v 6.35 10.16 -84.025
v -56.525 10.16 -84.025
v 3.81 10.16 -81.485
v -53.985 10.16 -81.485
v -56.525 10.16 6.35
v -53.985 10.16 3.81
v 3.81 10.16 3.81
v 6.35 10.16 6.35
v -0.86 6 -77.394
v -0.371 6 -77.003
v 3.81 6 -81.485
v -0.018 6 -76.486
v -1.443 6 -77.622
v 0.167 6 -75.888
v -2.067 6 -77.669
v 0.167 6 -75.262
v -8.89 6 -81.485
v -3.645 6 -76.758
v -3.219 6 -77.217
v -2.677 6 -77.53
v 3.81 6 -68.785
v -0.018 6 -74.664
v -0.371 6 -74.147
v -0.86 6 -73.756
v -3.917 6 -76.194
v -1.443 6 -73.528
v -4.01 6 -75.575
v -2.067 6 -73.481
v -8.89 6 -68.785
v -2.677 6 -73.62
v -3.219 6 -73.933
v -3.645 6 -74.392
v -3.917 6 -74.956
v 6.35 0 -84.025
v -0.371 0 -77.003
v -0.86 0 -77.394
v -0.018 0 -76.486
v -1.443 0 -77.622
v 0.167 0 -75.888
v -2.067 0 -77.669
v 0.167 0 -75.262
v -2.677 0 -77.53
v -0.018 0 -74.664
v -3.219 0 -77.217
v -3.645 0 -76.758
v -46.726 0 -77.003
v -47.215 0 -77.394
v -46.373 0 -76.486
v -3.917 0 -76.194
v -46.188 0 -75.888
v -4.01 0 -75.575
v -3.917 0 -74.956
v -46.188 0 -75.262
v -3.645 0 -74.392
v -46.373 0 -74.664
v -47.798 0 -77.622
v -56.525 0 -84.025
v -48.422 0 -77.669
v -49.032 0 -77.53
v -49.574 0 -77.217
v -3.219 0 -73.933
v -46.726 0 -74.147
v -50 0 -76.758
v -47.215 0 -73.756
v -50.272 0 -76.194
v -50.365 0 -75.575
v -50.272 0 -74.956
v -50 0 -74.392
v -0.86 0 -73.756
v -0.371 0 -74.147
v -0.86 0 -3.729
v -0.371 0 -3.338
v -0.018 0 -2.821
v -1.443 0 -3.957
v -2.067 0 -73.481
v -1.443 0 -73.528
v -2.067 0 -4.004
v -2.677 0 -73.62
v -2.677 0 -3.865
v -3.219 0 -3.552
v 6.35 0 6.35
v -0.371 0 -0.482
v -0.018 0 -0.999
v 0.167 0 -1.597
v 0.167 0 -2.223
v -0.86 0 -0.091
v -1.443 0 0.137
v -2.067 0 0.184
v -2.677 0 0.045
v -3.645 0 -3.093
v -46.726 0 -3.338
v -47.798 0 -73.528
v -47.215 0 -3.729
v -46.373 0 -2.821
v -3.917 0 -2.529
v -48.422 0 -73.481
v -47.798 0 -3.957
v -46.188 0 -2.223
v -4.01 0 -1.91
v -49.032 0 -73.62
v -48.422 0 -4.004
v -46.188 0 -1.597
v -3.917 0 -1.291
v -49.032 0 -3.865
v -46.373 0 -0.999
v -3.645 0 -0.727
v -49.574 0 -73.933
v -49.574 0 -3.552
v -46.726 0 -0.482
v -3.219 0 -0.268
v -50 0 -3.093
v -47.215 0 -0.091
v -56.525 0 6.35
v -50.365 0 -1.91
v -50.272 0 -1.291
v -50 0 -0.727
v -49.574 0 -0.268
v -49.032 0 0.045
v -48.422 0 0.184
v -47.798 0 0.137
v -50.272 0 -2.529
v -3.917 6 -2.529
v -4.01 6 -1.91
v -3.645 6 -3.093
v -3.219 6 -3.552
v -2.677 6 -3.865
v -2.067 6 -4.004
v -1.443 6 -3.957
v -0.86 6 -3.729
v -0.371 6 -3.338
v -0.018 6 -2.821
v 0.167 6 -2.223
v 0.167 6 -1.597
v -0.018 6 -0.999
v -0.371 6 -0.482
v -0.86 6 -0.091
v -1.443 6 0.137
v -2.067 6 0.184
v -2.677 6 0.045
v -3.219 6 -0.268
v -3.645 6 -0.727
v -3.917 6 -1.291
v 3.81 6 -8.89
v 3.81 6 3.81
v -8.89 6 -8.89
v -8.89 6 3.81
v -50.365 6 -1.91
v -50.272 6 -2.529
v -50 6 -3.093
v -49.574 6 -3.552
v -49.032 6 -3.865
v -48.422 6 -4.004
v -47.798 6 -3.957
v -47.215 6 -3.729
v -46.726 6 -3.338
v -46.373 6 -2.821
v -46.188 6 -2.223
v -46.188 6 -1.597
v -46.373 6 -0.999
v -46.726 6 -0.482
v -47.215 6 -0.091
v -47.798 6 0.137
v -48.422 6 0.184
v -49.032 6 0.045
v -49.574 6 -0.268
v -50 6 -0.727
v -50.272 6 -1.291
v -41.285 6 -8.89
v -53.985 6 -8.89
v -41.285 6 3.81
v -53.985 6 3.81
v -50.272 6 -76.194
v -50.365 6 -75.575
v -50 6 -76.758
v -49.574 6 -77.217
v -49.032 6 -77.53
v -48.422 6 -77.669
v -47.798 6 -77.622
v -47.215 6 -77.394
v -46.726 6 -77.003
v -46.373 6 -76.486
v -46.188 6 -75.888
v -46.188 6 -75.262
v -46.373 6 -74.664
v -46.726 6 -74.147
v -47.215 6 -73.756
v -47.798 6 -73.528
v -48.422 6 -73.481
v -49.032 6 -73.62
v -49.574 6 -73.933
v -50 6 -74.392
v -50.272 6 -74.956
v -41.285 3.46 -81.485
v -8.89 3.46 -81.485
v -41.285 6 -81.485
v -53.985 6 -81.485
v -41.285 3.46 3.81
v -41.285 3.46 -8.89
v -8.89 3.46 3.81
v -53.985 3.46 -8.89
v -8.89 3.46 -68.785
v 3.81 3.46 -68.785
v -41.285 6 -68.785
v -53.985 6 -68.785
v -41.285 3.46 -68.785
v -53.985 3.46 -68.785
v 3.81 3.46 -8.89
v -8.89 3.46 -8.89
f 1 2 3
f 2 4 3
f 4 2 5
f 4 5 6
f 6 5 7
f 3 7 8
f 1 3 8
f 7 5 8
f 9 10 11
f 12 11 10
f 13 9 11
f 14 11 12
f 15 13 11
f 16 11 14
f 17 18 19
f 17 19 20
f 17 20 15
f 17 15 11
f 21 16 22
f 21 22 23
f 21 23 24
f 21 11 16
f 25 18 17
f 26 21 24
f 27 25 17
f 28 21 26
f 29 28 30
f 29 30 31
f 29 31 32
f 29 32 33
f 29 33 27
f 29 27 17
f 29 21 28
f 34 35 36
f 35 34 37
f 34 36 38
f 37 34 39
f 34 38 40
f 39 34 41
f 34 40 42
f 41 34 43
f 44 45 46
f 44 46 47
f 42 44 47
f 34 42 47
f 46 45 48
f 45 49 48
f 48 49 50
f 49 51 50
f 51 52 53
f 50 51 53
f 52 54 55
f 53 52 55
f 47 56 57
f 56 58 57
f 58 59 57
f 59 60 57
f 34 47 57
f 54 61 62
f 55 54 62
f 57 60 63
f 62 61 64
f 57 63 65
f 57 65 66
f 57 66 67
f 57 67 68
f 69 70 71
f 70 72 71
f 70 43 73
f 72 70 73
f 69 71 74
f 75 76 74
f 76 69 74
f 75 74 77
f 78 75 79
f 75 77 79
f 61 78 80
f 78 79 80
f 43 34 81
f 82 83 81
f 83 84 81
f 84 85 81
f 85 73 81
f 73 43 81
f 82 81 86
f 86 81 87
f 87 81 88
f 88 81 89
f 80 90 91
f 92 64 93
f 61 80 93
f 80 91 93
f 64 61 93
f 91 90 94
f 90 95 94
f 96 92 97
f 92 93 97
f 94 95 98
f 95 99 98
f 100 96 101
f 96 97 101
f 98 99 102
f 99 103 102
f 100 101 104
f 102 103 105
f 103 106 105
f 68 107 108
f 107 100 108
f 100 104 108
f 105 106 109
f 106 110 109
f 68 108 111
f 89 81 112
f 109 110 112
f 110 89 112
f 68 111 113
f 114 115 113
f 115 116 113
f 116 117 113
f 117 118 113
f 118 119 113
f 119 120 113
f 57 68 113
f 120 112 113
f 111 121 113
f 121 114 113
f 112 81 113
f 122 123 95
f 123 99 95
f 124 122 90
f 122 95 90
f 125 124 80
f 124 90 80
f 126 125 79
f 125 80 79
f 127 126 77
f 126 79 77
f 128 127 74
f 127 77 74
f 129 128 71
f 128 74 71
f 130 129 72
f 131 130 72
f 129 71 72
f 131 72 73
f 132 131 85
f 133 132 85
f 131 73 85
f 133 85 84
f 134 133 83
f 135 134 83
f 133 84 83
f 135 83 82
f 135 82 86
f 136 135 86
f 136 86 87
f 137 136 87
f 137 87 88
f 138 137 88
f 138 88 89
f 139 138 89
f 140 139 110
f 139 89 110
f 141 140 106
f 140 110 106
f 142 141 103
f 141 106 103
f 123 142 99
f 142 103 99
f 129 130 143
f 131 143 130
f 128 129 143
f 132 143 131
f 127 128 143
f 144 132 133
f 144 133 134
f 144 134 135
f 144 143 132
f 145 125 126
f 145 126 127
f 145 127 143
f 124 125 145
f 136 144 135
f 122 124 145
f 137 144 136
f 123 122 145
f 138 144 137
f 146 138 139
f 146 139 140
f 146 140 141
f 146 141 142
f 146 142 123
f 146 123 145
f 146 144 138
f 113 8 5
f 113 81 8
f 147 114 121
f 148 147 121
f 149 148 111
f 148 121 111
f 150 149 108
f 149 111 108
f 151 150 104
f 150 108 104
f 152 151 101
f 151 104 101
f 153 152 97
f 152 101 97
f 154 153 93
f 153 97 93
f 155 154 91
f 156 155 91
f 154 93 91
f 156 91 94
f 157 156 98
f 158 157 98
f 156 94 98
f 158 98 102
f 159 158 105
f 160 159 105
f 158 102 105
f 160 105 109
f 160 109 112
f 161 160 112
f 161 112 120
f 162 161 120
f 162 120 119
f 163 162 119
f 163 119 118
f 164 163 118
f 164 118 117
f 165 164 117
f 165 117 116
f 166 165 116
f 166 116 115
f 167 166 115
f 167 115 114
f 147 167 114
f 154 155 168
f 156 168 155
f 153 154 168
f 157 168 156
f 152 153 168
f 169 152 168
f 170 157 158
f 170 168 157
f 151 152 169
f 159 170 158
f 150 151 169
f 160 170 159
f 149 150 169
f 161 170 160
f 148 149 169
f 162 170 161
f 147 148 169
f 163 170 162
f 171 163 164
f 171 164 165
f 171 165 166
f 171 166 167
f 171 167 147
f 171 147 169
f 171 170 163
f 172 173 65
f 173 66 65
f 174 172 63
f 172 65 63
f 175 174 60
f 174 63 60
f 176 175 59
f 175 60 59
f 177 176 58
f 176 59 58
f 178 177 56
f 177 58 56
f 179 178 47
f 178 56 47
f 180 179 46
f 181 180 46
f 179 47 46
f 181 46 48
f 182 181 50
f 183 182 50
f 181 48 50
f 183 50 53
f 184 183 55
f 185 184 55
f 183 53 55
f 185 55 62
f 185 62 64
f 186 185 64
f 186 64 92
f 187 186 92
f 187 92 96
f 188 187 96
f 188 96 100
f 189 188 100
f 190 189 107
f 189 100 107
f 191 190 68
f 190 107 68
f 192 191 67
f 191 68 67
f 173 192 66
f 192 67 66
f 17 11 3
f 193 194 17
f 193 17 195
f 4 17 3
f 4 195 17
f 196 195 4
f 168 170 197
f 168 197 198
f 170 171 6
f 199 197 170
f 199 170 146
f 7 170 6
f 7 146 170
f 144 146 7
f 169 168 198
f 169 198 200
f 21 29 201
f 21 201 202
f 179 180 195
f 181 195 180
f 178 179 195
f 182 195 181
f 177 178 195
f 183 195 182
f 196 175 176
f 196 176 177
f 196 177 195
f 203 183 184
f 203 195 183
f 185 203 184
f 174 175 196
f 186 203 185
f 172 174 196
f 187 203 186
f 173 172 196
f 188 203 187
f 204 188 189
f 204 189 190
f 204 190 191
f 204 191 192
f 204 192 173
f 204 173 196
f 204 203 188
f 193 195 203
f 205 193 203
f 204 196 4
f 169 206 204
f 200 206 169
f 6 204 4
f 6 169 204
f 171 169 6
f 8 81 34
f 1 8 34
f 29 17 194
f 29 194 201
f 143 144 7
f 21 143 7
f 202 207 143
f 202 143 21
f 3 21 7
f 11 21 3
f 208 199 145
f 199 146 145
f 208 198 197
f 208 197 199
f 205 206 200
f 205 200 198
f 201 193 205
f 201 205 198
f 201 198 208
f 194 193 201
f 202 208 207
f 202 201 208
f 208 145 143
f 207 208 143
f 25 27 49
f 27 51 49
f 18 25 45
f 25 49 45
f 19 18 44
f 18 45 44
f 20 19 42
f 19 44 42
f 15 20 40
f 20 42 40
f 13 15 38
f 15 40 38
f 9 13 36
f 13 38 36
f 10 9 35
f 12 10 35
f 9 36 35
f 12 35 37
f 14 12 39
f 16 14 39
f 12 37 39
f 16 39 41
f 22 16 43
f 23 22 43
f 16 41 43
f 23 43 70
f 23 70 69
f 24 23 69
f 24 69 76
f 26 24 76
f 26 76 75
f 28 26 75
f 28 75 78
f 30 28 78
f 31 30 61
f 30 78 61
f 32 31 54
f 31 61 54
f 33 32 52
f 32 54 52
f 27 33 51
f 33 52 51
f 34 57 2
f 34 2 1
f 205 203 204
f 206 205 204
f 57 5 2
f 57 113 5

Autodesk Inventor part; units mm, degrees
ref_plane "YZ Plane" through (0, 0, 0) normal (1, 0, 0) x (0, 1, 0)
ref_plane "XZ Plane" through (0, 0, 0) normal (0, 1, 0) x (-1, 0, 0)
ref_plane "XY Plane" through (0, 0, 0) normal (0, 0, 1) x (1, 0, 0)
sketch "Sketch1" plane through (0, 0, 0) normal (0, 1, 0) x (-1, 0, 0)
  line L0 (0, 0) -> (50.175, 0)
  line L1 (50.175, 0) -> (50.175, -77.485)
  line L2 (50.175, -77.485) -> (0, -77.485)
  line L3 (0, -77.485) -> (0, 0)
  circle A0 centre (48.265, -1.91) radius 2.1
  circle A1 centre (48.265, -75.575) radius 2.1
  circle A2 centre (1.91, -1.91) radius 2.1
  circle A3 centre (1.91, -75.575) radius 2.1
  line L4 (50.175, 0) -> (53.985, 0)
  line L5 (53.985, 0) -> (53.985, -77.675)
  line L6 (53.985, -77.675) -> (50.175, -77.675)
  line L7 (50.175, -77.675) -> (50.175, 0)
  line L8 (0, 0) -> (-3.81, 0)
  line L9 (-3.81, 0) -> (-3.81, -77.675)
  line L10 (-3.81, -77.675) -> (0, -77.675)
  line L11 (0, -77.675) -> (0, 0)
  line L12 (53.985, -77.675) -> (-3.81, -77.675)
  line L13 (-3.81, -77.675) -> (-3.81, -81.485)
  line L14 (-3.81, -81.485) -> (53.985, -81.485)
  line L15 (53.985, -81.485) -> (53.985, -77.675)
  line L16 (-3.81, 0) -> (53.985, 0)
  line L17 (53.985, 0) -> (53.985, 3.81)
  line L18 (53.985, 3.81) -> (-3.81, 3.81)
  line L19 (-3.81, 3.81) -> (-3.81, 0)
  point P0 (0, -77.485)
  point P1 (0, -76.4479)
  point P2 (0, -74.7021)
  point P3 (0, -2.7829)
  point P4 (0, -1.0371)
  dimension "d0" = 77.485
  dimension "d1" = 50.175
  dimension "d3" = 4.2
  dimension "d4" = 4.2
  dimension "d6" = 1.91
  dimension "d7" = 1.91
  dimension "d8" = 1.91
  dimension "d9" = 4.2
  dimension "d10" = 4.2
  dimension "d11" = 1.91
  dimension "d12" = 1.91
  dimension "d13" = 1.91
  dimension "d14" = 1.91
  dimension "d15" = 1.91
  dimension "d18" = 3.81
  dimension "d19" = 3.81
  dimension "d20" = 3.81
  dimension "d21" = 3.81
extrude "Extrusion2" add sketch "Sketch1" along normal blind 6 contours L8 L19 L18 L17 L4 L0 A0 A2 | L0 A2 L3 | L3 A2 A3 L11 L10 L9 L8 | L0 A0 L1 A1 L2 A3 L3 A2 | L10 L12 L6 L15 L14 L13 | L11 L2 A3 L12 | L0 L1 A0 | A0 L1 L4 L5 L6 L7 A1 | A3 L2 L3 | A3 L2 A1 L12 | A1 L2 L7 L12 | L1 L2 A1 picked at (0.2904, -0.2904) picked at (49.8846, -0.2904) picked at (0.2904, -77.1946) picked at (49.8846, -77.1946)
sketch "Sketch2" plane through (0, 6, 0) normal (0, 1, 0) x (1, 0, 0)
  circle A0 centre (-1.91, 1.91) radius 2.1 projected
  circle A1 centre (-48.265, 1.91) radius 2.1 projected
  circle A2 centre (-48.265, 75.575) radius 2.1 projected
  line L0 (3.81, -3.81) -> (3.81, 81.485) projected
  line L1 (3.81, 81.485) -> (-53.985, 81.485) projected
  line L2 (-53.985, 81.485) -> (-53.985, -3.81) projected
  line L3 (-53.985, -3.81) -> (3.81, -3.81) projected
  circle A3 centre (-1.91, 75.575) radius 2.1 projected
  point P0 (0, 0)
sketch "Sketch3" plane through (0, 0, 0) normal (0, -1, 0) x (1, 0, 0)
  line L0 (-53.985, 3.81) -> (3.81, 3.81) projected
  line L1 (-53.985, 3.81) -> (3.81, 3.81)
  line L2 (3.81, 3.81) -> (3.81, 6.35)
  line L3 (3.81, 6.35) -> (-53.985, 6.35)
  line L4 (-53.985, 6.35) -> (-53.985, 3.81)
  circle A0 centre (-1.91, -1.91) radius 2.1 projected
  circle A1 centre (-48.265, -1.91) radius 2.1 projected
  circle A2 centre (-48.265, -75.575) radius 2.1 projected
  line L5 (3.81, 3.81) -> (3.81, -81.485) projected
  line L6 (-53.985, 3.81) -> (3.81, 3.81) projected
  line L7 (-53.985, -81.485) -> (-53.985, 3.81) projected
  line L8 (3.81, -81.485) -> (-53.985, -81.485) projected
  circle A3 centre (-1.91, -75.575) radius 2.1 projected
  line L9 (3.81, 6.35) -> (6.35, 6.35)
  line L10 (6.35, 6.35) -> (6.35, -81.485)
  line L11 (6.35, -81.485) -> (3.81, -81.485)
  line L12 (3.81, -81.485) -> (3.81, 6.35)
  line L13 (3.81, -81.485) -> (-53.985, -81.485) projected
  line L14 (-53.985, -81.485) -> (6.35, -81.485)
  line L15 (6.35, -81.485) -> (6.35, -84.025)
  line L16 (6.35, -84.025) -> (-53.985, -84.025)
  line L17 (-53.985, -84.025) -> (-53.985, -81.485)
  line L18 (-53.985, 6.35) -> (-56.525, 6.35)
  line L19 (-56.525, 6.35) -> (-56.525, -84.025)
  line L20 (-56.525, -84.025) -> (-53.985, -84.025)
  line L21 (-53.985, -84.025) -> (-53.985, 6.35)
  point P0 (0, 0)
  dimension "d24" = 2.54
  dimension "d25" = 2.54
  dimension "d26" = 2.54
  dimension "d27" = 2.54
extrude "Extrusion3" add sketch "Sketch3" against normal blind 10.16 contours L4 L3 L2 L0 | L7 L17 L20 L19 L18 L4 | L2 L9 L10 L11 L5 | L8 L11 L15 L16 L17
sketch "Sketch4" plane through (0, 6, 0) normal (0, 1, 0) x (1, 0, 0)
  point P0 (0, 0)
sketch "Sketch5" plane through (0, 6, 0) normal (0, 1, 0) x (1, 0, 0)
  circle A0 centre (-1.91, 1.91) radius 2.1 projected
  circle A1 centre (-48.265, 1.91) radius 2.1 projected
  circle A2 centre (-48.265, 75.575) radius 2.1 projected
  line L0 (3.81, -3.81) -> (3.81, 81.485) projected
  line L1 (3.81, 81.485) -> (-53.985, 81.485) projected
  line L2 (-53.985, 81.485) -> (-53.985, -3.81) projected
  line L3 (-53.985, -3.81) -> (3.81, -3.81) projected
  circle A3 centre (-1.91, 75.575) radius 2.1 projected
  line L4 (-56.525, 84.025) -> (-56.525, -6.35) projected
  line L5 (-53.985, -3.81) -> (-53.985, 81.485) projected
  line L6 (-53.985, -3.81) -> (3.81, 81.485)
  line L7 (-53.985, 81.485) -> (-53.985, -3.81) projected
  line L8 (-53.985, 81.485) -> (3.81, -3.81)
  line L9 (-53.985, 81.485) -> (-41.285, 81.485)
  line L10 (-41.285, 81.485) -> (-41.285, 68.785)
  line L11 (-41.285, 68.785) -> (-53.985, 68.785)
  line L12 (-53.985, 68.785) -> (-53.985, 81.485)
  line L13 (3.81, 81.485) -> (-53.985, 81.485) projected
  line L14 (3.81, 81.485) -> (-8.89, 81.485)
  line L15 (-8.89, 81.485) -> (-8.89, 68.785)
  line L16 (-8.89, 68.785) -> (3.81, 68.785)
  line L17 (3.81, 68.785) -> (3.81, 81.485)
  line L18 (-53.985, -3.81) -> (3.81, -3.81) projected
  line L19 (-53.985, -3.81) -> (-41.285, -3.81)
  line L20 (-41.285, -3.81) -> (-41.285, 8.89)
  line L21 (-41.285, 8.89) -> (-53.985, 8.89)
  line L22 (-53.985, 8.89) -> (-53.985, -3.81)
  line L23 (3.81, -3.81) -> (-8.89, -3.81)
  line L24 (-8.89, -3.81) -> (-8.89, 8.89)
  line L25 (-8.89, 8.89) -> (3.81, 8.89)
  line L26 (3.81, 8.89) -> (3.81, -3.81)
  point P0 (0, 0)
  dimension "d30" = 12.7
  dimension "d31" = 12.7
  dimension "d32" = 12.7
  dimension "d33" = 12.7
  dimension "d34" = 12.7
  dimension "d35" = 12.7
extrude "Extrusion4" cut sketch "Sketch5" against normal blind 2.54 contours L25 L24 L3 L20 L21 L6 L8 | L8 L6 L16 L0 L25 | L8 L11 L10 L1 L15 L16 L6 | L6 L21 L2 L11 L8
properties part number "PCB_BOARD_Holder_"
